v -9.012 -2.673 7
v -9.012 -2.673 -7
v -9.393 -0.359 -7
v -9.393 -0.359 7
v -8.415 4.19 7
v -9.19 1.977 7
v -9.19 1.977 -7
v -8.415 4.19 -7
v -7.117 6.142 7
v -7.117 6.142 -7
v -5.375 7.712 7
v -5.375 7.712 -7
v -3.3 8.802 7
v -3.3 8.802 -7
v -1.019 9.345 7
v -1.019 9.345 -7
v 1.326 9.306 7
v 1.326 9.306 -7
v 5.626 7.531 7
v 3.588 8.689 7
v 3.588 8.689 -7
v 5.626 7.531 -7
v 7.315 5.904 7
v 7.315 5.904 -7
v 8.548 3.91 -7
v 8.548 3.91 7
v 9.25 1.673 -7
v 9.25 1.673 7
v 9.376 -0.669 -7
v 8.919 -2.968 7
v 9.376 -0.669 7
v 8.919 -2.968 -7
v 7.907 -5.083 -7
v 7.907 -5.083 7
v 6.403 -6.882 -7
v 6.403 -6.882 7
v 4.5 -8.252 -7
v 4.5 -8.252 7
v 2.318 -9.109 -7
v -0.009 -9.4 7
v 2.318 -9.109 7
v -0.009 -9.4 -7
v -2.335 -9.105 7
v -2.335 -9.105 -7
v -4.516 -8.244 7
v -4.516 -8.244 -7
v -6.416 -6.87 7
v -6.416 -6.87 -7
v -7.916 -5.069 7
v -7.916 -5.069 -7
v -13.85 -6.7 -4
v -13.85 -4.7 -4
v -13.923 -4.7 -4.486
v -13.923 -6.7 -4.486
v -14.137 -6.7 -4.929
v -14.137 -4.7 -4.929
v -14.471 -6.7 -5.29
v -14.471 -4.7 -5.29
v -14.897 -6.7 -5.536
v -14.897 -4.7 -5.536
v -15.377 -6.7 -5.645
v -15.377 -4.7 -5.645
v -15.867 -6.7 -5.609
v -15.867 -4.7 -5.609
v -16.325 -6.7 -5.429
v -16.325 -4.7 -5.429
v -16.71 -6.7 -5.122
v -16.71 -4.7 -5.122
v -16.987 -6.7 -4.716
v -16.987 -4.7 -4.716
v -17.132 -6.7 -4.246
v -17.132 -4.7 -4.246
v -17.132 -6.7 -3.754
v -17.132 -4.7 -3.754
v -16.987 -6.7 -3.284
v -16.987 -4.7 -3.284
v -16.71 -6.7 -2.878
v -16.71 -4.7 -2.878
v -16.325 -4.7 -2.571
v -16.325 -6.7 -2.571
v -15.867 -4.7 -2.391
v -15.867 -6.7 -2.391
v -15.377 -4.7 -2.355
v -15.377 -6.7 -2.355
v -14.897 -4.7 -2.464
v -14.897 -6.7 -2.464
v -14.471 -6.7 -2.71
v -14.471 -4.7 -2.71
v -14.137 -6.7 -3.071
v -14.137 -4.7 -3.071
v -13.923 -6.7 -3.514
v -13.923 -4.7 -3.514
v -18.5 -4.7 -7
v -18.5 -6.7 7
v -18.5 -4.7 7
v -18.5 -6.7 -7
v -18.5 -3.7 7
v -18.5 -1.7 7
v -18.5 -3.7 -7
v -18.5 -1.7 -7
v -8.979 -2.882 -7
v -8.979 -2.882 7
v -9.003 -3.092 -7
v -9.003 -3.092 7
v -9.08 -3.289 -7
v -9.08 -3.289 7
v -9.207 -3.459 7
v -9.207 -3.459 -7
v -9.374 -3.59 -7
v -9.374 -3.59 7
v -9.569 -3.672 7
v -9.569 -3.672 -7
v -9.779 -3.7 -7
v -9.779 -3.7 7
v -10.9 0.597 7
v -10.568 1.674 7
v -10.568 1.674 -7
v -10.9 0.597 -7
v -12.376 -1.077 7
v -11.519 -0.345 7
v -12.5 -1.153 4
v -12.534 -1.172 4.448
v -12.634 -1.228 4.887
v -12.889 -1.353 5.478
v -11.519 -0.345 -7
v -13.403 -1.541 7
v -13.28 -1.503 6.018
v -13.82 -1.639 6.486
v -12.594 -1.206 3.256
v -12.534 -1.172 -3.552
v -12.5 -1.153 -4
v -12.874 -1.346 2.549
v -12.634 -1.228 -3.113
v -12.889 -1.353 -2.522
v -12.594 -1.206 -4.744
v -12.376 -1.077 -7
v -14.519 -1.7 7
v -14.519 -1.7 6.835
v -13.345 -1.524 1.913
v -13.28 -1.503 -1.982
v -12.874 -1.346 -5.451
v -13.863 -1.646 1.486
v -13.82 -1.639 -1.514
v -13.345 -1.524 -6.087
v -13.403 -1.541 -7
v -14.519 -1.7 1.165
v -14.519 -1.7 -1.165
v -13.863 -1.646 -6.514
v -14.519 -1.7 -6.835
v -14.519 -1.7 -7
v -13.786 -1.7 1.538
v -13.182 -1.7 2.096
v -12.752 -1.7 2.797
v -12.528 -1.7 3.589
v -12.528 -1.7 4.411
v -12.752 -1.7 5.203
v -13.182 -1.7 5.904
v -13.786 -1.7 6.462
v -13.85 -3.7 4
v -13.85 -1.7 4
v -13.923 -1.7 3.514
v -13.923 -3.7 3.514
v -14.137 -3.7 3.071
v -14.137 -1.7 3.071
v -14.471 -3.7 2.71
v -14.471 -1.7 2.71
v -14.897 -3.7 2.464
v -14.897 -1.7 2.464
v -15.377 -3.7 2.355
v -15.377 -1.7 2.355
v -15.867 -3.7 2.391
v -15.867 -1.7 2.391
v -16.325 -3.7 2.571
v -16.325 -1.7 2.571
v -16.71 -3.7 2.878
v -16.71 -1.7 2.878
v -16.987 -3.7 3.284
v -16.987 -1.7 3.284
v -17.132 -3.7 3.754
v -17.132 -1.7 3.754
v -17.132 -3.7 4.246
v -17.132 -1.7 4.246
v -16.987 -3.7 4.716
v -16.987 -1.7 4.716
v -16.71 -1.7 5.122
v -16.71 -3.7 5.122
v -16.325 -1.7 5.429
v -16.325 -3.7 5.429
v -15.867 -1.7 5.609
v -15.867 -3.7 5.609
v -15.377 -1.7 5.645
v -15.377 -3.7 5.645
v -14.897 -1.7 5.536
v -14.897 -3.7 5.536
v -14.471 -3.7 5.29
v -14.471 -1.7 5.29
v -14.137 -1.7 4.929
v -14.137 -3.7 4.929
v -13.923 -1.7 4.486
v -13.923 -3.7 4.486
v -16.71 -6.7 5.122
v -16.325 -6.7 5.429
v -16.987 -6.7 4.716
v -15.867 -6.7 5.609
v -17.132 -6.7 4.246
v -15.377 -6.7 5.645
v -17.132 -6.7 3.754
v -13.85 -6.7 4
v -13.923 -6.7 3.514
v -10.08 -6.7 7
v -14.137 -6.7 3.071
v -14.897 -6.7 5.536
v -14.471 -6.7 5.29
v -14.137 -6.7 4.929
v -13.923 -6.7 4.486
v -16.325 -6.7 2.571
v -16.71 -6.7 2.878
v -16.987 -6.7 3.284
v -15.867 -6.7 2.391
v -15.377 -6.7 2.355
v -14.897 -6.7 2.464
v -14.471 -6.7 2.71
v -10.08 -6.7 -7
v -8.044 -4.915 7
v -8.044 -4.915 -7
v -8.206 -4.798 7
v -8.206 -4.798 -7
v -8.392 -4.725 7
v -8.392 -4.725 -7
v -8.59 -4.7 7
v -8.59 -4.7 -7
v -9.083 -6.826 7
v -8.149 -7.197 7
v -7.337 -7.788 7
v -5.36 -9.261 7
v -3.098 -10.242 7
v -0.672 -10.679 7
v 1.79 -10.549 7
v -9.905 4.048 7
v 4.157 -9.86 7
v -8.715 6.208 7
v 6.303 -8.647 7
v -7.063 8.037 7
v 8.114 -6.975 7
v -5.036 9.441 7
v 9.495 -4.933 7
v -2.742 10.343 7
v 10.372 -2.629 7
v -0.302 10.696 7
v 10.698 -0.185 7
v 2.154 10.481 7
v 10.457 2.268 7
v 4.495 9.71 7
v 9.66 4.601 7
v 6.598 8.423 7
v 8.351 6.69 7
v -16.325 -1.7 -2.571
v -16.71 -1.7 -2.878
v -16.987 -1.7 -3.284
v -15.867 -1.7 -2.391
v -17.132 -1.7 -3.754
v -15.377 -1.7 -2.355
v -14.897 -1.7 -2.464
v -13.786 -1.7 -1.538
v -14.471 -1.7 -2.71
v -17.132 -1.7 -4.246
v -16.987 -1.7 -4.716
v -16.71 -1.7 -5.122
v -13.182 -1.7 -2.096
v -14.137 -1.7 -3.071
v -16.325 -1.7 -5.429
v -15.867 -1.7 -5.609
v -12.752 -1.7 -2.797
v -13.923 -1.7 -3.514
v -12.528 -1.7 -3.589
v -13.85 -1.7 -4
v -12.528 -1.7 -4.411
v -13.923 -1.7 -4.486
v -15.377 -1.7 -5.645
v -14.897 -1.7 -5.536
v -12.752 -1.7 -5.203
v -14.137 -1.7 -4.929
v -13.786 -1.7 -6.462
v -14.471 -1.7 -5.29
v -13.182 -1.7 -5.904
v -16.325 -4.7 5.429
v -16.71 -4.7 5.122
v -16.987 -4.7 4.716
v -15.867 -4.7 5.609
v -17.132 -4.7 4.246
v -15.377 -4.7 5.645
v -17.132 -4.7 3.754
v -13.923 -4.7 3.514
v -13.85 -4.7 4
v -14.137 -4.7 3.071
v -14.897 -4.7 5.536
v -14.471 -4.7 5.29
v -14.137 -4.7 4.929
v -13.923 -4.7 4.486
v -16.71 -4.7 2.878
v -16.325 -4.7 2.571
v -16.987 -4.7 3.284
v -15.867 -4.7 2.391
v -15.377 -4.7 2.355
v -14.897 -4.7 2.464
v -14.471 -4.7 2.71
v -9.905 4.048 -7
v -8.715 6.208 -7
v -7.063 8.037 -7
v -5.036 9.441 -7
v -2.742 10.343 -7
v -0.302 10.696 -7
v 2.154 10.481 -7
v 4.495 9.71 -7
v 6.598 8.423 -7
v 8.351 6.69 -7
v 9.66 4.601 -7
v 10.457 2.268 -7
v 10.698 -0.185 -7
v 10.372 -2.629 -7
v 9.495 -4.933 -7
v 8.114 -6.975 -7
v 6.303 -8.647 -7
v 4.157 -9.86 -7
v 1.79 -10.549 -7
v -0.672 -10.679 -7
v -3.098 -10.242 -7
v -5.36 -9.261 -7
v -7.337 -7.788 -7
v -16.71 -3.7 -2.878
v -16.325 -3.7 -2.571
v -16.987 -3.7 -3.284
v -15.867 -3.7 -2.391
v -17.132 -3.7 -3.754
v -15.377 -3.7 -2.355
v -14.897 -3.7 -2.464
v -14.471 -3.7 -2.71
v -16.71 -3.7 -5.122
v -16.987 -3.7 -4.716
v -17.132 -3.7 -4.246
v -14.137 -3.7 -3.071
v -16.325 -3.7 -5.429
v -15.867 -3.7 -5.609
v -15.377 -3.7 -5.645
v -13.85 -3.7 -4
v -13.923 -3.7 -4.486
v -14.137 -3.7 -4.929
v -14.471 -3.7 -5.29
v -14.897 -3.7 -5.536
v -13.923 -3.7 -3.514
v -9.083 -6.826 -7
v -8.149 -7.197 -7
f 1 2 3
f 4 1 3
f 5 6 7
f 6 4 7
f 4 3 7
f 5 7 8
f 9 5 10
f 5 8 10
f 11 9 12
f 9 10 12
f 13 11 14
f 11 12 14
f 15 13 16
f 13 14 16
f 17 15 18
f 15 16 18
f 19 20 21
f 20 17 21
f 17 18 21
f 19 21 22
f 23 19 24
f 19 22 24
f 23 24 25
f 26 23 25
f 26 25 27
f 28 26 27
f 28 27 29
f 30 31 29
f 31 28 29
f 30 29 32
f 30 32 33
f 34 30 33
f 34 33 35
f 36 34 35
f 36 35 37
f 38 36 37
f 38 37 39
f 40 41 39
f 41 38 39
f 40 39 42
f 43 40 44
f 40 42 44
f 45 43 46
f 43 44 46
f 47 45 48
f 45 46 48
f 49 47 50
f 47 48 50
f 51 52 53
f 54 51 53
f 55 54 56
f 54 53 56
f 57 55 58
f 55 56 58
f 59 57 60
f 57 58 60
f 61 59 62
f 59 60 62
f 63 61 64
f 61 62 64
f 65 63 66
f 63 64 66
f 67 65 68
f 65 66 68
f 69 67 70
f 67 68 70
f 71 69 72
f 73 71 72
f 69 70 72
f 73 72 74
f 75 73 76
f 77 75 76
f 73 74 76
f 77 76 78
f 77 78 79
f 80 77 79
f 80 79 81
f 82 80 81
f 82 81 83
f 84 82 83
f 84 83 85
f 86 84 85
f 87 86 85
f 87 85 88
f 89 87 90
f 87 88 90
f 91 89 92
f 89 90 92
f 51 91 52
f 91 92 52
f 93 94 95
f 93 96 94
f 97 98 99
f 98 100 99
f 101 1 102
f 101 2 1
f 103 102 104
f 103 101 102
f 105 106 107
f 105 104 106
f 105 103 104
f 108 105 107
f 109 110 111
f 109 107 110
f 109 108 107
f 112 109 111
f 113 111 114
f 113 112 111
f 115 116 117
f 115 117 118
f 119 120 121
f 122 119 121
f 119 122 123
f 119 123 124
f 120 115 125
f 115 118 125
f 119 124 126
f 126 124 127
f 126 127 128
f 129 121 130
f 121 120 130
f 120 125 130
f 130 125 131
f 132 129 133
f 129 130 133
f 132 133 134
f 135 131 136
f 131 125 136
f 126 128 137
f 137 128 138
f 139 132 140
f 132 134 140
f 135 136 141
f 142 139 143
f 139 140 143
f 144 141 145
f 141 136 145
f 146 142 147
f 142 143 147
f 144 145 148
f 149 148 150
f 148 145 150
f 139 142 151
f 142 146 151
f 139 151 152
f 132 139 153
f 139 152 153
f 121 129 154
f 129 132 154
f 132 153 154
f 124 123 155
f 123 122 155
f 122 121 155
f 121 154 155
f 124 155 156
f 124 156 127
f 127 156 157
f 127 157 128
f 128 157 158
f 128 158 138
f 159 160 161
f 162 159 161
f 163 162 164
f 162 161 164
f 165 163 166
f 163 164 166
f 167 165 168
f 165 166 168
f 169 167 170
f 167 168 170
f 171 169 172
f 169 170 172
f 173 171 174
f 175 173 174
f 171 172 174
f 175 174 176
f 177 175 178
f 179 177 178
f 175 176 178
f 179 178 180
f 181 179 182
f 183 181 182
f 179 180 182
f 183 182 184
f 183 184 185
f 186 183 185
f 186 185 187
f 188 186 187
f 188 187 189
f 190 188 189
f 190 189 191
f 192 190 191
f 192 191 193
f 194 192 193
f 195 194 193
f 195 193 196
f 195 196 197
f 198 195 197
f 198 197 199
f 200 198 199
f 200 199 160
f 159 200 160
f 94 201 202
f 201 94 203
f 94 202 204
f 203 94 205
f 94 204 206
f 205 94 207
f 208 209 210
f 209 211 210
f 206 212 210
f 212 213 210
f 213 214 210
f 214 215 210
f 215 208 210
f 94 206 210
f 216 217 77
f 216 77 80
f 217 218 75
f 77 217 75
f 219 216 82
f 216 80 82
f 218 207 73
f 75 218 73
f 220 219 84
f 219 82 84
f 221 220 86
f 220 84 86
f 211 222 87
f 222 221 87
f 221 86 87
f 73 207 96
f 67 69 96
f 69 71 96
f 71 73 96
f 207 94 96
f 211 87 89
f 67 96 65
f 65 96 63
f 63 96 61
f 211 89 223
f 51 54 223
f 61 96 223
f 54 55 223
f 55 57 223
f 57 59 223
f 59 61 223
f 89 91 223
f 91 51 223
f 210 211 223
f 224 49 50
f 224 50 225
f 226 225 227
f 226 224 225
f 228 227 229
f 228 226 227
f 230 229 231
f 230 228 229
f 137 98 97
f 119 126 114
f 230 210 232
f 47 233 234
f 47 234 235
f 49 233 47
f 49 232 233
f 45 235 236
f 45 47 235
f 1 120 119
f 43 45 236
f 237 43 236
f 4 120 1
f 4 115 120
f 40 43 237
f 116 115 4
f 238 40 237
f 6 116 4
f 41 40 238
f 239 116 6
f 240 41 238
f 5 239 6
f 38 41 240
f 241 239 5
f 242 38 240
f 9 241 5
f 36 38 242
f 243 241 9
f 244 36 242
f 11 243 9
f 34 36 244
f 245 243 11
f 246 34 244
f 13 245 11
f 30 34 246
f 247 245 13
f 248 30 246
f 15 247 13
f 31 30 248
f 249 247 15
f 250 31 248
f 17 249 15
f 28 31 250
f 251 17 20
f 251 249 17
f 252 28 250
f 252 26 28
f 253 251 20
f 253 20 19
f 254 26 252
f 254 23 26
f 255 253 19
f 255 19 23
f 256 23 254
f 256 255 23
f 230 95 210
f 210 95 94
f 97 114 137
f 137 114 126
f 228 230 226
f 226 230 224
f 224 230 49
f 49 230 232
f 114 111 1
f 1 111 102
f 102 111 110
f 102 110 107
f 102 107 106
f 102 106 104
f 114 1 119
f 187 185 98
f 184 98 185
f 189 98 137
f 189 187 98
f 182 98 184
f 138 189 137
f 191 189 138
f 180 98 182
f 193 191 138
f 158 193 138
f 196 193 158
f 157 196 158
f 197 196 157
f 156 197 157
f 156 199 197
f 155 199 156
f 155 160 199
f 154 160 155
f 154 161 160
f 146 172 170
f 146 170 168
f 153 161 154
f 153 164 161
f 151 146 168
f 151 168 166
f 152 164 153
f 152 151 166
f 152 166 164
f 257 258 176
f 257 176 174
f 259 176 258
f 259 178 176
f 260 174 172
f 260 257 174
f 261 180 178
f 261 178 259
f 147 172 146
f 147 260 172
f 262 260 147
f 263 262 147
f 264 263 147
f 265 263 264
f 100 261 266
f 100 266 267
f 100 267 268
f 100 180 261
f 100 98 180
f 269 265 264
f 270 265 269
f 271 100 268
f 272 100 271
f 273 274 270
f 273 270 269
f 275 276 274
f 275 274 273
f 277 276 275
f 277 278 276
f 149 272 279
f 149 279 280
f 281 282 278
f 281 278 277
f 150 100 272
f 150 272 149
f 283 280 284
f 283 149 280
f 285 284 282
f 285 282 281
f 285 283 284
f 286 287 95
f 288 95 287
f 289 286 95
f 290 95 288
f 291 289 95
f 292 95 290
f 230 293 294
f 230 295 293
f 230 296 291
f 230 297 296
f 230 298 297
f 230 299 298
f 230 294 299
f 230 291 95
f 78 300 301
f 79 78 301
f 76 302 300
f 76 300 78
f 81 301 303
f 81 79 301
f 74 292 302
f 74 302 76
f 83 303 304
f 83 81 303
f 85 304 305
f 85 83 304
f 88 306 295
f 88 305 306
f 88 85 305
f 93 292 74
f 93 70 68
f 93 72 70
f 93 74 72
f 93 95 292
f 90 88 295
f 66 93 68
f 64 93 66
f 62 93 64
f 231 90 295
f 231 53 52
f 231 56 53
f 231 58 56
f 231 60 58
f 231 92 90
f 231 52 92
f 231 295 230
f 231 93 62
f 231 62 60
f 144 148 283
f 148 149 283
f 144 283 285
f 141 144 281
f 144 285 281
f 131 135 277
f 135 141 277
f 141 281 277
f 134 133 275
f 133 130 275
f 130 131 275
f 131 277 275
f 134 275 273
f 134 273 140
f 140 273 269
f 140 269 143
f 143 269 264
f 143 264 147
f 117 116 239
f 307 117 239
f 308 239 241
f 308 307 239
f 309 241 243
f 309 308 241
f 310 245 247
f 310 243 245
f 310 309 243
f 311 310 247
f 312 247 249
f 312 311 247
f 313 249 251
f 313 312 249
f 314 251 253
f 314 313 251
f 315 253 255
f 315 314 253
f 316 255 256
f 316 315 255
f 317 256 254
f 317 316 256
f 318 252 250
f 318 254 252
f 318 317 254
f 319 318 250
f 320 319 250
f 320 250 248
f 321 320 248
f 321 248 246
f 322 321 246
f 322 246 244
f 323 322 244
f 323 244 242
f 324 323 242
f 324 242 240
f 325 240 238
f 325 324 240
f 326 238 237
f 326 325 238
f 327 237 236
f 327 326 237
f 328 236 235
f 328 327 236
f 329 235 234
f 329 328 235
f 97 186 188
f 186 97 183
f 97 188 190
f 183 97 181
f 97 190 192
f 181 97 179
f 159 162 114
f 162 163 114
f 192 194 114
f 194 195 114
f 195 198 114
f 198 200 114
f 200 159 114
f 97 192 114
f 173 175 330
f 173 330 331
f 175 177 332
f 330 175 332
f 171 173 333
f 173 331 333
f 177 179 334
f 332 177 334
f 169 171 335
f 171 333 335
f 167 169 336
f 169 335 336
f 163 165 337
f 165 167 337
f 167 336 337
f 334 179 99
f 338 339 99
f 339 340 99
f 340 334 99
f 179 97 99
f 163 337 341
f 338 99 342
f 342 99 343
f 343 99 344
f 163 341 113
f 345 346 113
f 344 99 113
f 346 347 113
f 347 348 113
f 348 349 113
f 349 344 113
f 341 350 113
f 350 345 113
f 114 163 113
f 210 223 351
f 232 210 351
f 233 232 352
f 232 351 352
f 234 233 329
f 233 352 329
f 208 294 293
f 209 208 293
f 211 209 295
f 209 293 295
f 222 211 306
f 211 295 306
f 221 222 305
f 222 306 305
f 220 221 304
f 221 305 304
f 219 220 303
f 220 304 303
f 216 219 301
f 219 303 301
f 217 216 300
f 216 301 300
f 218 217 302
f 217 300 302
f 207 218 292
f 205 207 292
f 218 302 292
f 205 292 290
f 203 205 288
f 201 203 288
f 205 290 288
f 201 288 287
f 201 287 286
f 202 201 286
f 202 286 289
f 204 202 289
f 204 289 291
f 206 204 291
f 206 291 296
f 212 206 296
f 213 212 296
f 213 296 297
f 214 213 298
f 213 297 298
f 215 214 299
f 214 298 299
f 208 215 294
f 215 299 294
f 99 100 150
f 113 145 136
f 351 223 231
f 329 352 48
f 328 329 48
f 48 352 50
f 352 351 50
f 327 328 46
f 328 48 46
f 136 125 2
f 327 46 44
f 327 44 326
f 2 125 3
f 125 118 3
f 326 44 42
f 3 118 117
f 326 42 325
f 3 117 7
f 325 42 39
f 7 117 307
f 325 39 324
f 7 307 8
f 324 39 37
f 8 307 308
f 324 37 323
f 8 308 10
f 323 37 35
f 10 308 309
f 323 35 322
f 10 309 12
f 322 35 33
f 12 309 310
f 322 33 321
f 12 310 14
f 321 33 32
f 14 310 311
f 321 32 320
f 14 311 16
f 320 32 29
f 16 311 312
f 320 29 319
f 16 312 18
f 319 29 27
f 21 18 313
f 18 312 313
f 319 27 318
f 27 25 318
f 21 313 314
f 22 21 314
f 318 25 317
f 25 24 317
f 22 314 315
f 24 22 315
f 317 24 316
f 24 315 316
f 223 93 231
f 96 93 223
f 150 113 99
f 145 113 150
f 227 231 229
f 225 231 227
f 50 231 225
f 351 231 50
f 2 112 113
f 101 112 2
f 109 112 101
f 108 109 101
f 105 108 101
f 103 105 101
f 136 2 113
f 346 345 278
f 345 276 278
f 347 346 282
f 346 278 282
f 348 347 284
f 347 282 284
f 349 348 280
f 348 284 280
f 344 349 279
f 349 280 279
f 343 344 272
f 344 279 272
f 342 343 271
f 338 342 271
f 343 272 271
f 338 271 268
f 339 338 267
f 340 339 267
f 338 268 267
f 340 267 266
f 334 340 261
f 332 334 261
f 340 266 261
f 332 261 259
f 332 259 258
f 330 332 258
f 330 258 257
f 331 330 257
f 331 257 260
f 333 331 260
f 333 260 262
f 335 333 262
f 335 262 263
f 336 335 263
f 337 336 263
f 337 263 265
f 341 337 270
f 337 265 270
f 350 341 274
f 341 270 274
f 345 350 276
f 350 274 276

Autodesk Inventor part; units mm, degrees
ref_plane "YZ Plane" through (0, 0, 0) normal (1, 0, 0) x (0, 1, 0)
ref_plane "XZ Plane" through (0, 0, 0) normal (0, 1, 0) x (-1, 0, 0)
ref_plane "XY Plane" through (0, 0, 0) normal (0, 0, 1) x (1, 0, 0)
sketch "Skizze1" plane through (0, 0, 0) normal (0, 0, 1) x (1, 0, 0)
  arc A0 (-8.1406, -4.7) -> (-8.6412, -3.7) centre (0, 0) ccw
  line L0 (-18.5, -6.7) -> (-8.3427, -6.7)
  line L1 (-18.5, -6.7) -> (-18.5, -4.7)
  line L2 (-18.5, -4.7) -> (-8.1406, -4.7)
  line L3 (-18.5, -1.7) -> (-18.5, -3.7)
  line L4 (-18.5, -3.7) -> (-8.6412, -3.7)
  line L5 (-18.5, -1.7) -> (-14.519, -1.7)
  arc A1 (-8.3427, -6.7) -> (-10.5682, 1.6741) centre (0, 0) ccw
  arc A2 (-14.519, -1.7) -> (-10.5682, 1.6741) centre (-14.519, 2.3) ccw
  point P0 (-10.5641, -1.7)
  dimension "d0" = 18.8
  dimension "d2" = 2
  dimension "d4" = 1
  dimension "d5" = 18.5
  dimension "d6" = 4
  dimension "d7" = 1.3
  dimension "d19" = 10.1573
  dimension "d26" = 4
extrude "Extrusion1" add sketch "Skizze1" along normal mid plane 14
sketch "Skizze2" plane through (-18.5, -1.7, 7) normal (0, 1, 0) x (1, 0, 0)
  circle A0 centre (3, 11) radius 1.65
  line L0 (0, 14) -> (3.981, 14) projected
  line L1 (0, 14) -> (0, 0) projected
  line L2 (0, 14) -> (0, 0) construction
  line L3 (0, 7) -> (7.2294, 7) construction
  circle A1 centre (3, 3) radius 1.65
  circle A2 centre (3, 11) radius 3
  circle A3 centre (3, 3) radius 3
  point P0 (18.5, 7)
  point P1 (9.0709, 16)
  point P2 (0, 3)
  point P3 (0, 0.6676)
  point P4 (0.6676, 16)
  point P5 (0, 11)
  point P6 (0, 10.6676)
  point P7 (3, 14)
  dimension "d10" = 3
  dimension "d11" = 3
  dimension "d12" = 3.3
  dimension "d20" = 6
extrude "Extrusion2" cut sketch "Skizze2" against normal through all both and the other way through all contours A0 | A1
fillet "Rundung2" radius 4 1 edges at (-8.3427, -6.7, 0)
fillet "Rundung3" radius 0.8 2 edges at (-8.6412, -3.7, 0) (-8.1406, -4.7, 0)
extrude "Extrusion4" cut sketch "Skizze2" along normal blind 10 contours A3 | A2
properties part number "Halterung_Akku_210403"
